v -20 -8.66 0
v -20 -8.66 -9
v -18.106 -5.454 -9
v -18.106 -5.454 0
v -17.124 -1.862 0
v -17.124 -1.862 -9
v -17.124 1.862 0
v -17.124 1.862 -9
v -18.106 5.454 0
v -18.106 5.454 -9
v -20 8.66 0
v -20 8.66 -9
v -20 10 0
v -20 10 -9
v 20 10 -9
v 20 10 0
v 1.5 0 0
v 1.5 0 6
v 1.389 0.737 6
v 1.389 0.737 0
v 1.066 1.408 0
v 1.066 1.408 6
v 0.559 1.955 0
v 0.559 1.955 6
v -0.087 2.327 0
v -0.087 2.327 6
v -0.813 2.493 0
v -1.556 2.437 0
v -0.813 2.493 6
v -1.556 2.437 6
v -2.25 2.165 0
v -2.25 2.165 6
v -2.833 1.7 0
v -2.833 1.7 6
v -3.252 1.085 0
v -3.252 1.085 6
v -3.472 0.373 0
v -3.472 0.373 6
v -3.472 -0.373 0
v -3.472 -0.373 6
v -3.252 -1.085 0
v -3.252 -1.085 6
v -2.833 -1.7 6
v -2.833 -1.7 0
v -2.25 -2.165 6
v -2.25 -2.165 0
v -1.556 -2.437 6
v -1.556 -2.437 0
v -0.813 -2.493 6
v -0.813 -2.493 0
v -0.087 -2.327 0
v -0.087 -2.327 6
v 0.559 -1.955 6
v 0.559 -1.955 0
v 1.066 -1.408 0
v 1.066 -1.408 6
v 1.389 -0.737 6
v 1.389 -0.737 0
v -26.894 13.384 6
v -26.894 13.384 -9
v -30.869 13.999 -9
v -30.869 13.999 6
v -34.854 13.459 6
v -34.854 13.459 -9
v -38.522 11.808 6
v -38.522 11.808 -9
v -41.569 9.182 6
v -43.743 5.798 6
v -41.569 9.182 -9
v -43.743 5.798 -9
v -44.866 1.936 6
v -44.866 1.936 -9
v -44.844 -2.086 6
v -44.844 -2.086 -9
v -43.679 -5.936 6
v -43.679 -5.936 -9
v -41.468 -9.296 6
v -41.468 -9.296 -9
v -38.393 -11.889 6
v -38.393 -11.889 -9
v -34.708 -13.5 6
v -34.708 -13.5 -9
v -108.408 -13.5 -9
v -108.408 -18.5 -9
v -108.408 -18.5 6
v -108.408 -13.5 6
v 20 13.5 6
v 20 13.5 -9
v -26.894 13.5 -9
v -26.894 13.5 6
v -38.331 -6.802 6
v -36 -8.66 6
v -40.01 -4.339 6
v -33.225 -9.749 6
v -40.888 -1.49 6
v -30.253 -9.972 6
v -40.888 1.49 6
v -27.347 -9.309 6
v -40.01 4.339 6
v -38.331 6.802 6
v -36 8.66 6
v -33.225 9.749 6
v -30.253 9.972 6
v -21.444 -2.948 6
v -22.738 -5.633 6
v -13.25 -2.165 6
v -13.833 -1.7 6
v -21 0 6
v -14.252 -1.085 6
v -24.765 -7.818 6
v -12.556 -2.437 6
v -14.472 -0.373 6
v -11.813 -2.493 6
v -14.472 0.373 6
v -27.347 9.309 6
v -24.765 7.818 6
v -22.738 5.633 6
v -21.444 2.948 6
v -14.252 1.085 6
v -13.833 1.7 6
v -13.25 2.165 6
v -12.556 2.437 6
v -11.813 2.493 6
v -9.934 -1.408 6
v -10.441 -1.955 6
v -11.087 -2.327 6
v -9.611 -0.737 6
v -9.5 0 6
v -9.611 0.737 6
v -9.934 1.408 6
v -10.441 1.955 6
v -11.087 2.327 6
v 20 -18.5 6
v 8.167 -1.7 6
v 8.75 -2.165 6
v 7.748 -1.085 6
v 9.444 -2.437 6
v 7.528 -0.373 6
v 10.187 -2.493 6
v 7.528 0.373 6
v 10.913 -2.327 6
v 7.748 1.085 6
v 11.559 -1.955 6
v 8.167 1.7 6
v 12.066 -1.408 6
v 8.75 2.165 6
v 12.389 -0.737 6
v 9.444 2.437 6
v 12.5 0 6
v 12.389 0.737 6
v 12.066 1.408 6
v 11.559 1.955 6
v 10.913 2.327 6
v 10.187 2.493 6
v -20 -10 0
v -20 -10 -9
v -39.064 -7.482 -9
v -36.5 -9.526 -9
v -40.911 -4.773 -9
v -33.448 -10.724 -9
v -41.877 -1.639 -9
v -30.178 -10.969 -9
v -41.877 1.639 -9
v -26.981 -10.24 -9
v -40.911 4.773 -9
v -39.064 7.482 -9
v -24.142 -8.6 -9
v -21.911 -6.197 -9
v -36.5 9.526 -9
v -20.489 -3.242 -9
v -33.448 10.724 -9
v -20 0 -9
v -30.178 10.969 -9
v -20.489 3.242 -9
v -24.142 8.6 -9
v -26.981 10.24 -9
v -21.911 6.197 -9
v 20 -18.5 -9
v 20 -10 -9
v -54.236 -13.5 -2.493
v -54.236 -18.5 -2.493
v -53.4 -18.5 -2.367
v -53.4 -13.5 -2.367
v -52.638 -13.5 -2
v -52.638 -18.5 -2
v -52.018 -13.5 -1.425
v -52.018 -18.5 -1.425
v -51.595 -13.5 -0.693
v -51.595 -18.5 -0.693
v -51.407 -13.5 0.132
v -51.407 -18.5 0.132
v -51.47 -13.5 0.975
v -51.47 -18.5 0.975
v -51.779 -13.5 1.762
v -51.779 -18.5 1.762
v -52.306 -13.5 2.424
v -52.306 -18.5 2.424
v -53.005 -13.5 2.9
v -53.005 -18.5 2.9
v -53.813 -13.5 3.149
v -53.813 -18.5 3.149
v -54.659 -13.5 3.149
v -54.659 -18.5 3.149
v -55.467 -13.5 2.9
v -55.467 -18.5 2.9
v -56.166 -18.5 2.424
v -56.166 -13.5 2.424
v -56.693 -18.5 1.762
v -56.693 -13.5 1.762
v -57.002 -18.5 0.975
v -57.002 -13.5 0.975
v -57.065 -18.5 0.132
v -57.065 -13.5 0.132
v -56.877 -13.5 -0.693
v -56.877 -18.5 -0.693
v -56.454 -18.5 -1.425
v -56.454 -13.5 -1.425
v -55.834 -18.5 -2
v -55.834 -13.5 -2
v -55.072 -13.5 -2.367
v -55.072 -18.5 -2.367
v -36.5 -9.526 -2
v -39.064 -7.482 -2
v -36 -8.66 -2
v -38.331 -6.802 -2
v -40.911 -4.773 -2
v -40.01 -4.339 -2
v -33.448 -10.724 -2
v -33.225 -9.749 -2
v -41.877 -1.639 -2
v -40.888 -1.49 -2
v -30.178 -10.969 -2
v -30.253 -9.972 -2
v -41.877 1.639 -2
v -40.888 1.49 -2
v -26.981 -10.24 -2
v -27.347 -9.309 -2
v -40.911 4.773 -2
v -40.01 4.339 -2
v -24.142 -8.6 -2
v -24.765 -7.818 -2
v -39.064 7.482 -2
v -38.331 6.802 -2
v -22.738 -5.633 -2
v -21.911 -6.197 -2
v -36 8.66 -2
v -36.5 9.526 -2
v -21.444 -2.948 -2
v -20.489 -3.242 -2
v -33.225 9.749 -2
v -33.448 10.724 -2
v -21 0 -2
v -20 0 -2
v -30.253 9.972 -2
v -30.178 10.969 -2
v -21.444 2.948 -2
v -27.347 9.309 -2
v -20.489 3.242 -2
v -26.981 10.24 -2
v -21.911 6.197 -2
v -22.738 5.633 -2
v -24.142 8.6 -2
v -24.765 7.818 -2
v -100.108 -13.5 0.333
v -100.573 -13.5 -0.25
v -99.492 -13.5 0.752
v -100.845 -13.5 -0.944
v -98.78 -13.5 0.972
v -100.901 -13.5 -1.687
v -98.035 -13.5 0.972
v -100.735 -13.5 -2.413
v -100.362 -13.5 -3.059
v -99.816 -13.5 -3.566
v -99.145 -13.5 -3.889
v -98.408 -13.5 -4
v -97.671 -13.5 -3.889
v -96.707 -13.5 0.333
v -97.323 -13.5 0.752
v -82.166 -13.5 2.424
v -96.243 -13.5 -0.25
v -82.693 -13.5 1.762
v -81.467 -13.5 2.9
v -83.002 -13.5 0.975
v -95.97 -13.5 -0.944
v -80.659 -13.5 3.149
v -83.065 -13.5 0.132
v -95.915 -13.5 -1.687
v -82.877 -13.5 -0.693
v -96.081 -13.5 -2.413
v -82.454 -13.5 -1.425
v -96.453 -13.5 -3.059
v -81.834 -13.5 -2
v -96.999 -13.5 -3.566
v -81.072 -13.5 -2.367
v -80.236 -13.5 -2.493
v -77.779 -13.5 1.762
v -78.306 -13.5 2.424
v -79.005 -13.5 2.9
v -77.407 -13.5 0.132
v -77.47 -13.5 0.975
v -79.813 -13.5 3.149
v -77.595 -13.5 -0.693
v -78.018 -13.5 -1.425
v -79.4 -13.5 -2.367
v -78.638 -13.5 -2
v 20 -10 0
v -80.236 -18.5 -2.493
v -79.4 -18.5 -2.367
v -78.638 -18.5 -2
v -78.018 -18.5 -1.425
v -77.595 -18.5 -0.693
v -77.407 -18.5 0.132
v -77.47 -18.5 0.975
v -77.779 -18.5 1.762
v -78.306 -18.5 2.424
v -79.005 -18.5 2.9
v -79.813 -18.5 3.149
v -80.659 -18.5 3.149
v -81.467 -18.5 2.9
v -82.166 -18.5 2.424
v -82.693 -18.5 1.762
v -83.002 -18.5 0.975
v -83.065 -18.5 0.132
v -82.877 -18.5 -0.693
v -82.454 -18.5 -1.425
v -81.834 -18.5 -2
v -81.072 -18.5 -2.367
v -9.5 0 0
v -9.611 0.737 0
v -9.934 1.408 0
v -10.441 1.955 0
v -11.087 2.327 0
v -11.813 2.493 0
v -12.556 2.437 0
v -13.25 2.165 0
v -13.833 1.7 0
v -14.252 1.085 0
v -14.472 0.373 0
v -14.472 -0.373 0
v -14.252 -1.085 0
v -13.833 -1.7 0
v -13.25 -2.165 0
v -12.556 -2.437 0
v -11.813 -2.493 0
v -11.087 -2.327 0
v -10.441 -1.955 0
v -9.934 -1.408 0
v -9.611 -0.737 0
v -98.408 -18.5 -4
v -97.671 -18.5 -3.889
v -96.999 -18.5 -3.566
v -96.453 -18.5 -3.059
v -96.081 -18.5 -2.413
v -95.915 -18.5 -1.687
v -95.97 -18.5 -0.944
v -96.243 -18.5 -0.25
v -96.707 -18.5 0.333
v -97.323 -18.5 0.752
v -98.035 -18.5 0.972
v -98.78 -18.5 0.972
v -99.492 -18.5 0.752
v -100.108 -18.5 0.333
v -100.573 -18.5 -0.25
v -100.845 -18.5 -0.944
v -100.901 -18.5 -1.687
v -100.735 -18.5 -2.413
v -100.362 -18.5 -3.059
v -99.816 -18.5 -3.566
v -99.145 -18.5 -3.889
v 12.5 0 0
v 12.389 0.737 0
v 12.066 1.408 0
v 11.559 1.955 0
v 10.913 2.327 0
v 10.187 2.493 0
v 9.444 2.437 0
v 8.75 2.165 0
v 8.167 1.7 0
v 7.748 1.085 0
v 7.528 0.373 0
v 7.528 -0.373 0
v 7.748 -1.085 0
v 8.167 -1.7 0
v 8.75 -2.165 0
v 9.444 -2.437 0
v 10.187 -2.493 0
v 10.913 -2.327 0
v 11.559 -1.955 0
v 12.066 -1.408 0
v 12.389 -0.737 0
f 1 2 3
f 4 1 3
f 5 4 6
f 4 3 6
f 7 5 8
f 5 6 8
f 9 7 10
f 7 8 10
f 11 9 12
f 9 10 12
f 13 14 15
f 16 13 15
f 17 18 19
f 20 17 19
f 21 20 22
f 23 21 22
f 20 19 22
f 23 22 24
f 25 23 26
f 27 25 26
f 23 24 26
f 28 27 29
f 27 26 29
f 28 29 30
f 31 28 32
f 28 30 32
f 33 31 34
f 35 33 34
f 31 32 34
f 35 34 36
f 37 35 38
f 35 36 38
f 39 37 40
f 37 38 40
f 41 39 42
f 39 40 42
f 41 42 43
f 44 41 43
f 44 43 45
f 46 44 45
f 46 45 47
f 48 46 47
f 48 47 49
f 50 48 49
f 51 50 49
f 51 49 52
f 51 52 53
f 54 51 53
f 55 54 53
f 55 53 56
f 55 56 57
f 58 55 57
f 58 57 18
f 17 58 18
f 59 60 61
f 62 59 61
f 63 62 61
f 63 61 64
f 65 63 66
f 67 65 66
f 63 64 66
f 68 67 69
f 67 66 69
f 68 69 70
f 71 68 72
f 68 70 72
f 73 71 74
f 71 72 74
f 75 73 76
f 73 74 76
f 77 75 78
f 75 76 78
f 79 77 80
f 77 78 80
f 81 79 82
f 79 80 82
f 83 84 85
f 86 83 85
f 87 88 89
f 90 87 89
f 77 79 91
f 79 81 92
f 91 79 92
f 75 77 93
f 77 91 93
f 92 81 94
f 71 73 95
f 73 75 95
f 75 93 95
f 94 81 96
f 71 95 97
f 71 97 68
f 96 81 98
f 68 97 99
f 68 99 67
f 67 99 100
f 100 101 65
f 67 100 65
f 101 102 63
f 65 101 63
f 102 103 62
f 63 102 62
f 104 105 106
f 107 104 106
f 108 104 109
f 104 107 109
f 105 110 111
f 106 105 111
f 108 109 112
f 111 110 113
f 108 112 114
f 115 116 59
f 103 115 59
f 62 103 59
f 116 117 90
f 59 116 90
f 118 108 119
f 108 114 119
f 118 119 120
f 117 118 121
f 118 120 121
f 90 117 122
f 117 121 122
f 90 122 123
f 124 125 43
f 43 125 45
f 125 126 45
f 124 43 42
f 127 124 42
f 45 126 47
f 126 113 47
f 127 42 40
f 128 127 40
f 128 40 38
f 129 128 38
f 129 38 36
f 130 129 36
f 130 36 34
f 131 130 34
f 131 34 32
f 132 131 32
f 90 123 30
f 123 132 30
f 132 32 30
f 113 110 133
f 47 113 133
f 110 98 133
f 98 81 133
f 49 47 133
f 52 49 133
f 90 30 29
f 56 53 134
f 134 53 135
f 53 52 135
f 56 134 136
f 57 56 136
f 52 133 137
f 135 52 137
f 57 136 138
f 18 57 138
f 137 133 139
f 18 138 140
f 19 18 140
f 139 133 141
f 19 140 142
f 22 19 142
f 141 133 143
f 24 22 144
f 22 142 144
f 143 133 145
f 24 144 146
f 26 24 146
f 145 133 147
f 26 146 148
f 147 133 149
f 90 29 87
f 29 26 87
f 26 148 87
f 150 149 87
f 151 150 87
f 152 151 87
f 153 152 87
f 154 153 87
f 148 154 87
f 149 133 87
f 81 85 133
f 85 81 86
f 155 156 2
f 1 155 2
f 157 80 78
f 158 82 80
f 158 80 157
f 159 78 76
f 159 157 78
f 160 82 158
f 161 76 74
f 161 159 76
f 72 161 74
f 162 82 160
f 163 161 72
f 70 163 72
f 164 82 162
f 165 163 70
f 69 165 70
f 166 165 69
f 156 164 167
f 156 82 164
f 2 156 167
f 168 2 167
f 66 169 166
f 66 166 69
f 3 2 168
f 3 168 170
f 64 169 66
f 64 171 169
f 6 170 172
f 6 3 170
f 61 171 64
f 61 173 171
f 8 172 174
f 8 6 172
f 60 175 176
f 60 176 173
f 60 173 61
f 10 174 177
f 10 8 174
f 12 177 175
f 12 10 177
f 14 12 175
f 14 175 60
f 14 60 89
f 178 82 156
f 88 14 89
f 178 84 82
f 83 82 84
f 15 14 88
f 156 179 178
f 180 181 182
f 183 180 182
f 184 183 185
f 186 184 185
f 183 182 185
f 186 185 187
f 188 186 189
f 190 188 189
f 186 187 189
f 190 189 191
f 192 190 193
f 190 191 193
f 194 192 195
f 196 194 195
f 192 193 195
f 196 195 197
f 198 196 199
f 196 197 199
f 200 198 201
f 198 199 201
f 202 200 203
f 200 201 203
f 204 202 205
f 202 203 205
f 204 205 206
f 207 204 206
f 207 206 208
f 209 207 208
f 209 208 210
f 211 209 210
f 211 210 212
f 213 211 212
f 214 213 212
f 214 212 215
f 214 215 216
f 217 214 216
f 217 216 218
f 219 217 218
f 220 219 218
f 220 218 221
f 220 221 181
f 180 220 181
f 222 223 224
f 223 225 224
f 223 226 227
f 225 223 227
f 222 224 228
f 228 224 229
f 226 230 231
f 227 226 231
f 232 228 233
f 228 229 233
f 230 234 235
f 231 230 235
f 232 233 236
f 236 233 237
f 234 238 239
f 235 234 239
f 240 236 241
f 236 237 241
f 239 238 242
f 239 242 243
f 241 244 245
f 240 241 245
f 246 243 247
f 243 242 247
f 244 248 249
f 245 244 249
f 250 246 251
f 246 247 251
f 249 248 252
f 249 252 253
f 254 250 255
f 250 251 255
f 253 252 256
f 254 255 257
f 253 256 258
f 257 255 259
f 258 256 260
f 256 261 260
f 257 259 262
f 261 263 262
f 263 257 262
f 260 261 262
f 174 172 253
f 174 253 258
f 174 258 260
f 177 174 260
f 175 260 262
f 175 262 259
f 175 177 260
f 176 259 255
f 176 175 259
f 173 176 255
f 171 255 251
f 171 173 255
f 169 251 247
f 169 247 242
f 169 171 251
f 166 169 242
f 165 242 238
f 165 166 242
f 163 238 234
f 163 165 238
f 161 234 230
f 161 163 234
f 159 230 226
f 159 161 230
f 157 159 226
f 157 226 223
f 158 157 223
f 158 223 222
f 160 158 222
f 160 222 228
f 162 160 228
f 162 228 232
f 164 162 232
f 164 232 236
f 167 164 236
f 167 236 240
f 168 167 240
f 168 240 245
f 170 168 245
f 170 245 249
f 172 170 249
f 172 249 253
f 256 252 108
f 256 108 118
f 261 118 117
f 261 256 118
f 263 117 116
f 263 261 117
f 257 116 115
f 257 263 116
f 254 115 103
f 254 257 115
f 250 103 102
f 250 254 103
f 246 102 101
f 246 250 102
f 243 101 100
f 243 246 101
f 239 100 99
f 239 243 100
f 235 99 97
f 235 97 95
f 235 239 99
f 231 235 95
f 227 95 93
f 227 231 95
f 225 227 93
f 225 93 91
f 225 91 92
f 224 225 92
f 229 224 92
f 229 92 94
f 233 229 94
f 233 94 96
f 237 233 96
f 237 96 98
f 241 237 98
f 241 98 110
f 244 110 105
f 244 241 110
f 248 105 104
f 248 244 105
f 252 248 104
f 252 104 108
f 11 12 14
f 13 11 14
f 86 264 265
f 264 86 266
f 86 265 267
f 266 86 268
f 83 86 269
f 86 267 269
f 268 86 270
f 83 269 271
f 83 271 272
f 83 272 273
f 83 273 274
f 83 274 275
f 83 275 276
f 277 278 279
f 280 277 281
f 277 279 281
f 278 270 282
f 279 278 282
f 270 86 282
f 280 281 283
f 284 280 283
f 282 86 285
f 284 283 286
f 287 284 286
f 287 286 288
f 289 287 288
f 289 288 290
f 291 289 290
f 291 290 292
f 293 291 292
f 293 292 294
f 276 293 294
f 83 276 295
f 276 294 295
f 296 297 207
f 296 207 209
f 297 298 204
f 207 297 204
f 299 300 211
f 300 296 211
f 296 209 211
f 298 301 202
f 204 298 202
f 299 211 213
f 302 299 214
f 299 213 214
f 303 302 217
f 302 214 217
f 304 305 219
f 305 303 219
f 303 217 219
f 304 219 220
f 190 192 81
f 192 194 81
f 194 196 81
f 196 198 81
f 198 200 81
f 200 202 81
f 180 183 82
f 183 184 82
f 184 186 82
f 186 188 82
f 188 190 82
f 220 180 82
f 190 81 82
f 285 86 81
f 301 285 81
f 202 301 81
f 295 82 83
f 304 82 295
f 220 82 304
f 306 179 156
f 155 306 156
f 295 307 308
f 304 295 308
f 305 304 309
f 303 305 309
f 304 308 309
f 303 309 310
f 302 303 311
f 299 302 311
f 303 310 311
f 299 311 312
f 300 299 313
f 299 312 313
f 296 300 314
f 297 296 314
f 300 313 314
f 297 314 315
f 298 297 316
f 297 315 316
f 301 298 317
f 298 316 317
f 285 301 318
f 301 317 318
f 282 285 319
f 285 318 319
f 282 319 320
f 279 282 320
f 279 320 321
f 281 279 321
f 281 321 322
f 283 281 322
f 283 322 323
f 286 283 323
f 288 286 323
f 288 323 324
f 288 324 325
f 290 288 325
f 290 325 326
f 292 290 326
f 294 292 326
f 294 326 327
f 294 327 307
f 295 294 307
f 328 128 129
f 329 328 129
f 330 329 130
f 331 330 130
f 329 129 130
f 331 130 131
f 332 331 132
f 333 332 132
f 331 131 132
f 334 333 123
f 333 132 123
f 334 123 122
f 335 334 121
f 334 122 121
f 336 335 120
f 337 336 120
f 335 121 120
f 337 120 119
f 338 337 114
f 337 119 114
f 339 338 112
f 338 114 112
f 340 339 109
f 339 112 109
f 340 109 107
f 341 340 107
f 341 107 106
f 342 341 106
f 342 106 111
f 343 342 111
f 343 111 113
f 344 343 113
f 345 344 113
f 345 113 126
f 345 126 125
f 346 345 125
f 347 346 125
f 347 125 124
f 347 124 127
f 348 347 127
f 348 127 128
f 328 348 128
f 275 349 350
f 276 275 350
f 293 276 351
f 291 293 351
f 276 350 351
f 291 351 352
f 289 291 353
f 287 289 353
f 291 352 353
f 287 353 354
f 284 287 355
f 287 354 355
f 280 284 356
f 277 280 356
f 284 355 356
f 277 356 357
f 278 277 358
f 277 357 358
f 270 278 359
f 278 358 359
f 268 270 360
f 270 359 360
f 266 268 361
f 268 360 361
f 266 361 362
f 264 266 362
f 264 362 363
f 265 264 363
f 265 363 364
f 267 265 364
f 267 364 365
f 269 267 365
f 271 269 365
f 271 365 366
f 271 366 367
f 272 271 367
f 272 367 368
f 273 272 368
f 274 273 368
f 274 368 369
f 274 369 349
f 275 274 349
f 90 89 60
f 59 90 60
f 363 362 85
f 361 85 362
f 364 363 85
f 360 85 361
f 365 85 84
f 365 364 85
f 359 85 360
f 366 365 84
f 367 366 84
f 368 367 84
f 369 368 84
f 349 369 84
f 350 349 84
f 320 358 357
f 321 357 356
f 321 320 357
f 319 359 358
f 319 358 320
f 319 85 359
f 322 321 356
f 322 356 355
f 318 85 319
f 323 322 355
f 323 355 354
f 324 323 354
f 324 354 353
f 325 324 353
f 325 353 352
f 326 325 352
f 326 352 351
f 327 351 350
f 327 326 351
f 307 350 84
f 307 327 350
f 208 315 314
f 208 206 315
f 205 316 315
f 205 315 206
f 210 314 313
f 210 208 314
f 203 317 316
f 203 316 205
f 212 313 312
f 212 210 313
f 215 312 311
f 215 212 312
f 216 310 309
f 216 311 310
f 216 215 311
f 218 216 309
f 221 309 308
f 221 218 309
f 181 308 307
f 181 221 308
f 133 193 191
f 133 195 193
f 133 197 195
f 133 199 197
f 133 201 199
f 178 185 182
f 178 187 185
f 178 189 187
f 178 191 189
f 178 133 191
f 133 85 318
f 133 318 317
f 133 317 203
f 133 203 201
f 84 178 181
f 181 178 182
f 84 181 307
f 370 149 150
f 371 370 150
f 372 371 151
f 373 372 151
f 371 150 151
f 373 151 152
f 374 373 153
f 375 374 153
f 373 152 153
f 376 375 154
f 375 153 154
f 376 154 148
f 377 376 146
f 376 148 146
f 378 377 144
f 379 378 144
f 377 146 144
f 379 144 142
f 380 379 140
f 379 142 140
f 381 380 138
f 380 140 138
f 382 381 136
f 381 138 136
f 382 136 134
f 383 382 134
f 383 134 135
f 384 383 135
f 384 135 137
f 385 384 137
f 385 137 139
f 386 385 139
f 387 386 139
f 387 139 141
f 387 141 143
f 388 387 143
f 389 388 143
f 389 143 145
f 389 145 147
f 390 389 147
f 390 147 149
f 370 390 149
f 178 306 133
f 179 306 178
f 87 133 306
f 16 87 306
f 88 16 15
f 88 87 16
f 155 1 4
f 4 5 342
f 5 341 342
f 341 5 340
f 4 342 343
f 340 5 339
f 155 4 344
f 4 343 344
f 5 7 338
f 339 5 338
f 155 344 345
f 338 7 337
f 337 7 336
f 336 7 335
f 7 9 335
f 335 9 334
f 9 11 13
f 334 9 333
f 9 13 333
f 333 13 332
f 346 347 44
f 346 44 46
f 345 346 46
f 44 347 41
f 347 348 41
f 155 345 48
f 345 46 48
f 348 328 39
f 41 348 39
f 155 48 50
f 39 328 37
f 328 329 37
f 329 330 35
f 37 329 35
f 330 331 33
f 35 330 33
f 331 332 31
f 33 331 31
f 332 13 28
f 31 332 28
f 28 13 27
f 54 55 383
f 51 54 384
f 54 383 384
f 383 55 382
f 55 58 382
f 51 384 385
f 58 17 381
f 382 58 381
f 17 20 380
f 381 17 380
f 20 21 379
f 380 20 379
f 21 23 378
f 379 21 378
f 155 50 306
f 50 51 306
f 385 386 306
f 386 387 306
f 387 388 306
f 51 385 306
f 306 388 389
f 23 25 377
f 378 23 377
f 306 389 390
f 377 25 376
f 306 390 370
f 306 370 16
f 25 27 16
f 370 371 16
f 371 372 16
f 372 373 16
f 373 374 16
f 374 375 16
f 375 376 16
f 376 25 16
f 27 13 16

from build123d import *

# Parameters (mm, degrees)
SKETCH_1_W          = 40
SKETCH_1_H          = 20
EXTRUDE_1_DEPTH     = 6
SKETCH_2_R          = 2.5
CUT_EXTRUDE_1_DEPTH = 24.151673806
EXTRUDE_START       = -15
EXTRUDE_2_OUTLINE_R = 11
EXTRUDE_2_DEPTH     = 15
EXTRUDE_START_2     = -8
SKETCH_5_R          = 11
SKETCH_5_R_2        = 10
EXTRUDE_3_DEPTH     = 8
SKETCH_10_W         = 15
SKETCH_10_H         = 5
EXTRUDE_4_DEPTH     = 200
SKETCH_11_W         = 3.09493726
SKETCH_11_H         = 3.09493726
EXTRUDE_5_DEPTH     = 15
SKETCH_17_W         = 83.501719846
SKETCH_17_H         = 42.356909186
CUT_EXTRUDE_2_DEPTH = 184.131783151
SKETCH_18_R         = 2.5
CUT_EXTRUDE_3_DEPTH = 10
SKETCH_20_R         = 2.837069856
CUT_EXTRUDE_4_DEPTH = 10


# Read off the part's stored shape, not the designer's step: 凸台-拉伸2
with BuildPart() as part:
    # 草图1 → 凸台-拉伸1 (new body)
    with BuildSketch(Plane.XY):
        Rectangle(SKETCH_1_W, SKETCH_1_H)
    extrude(amount=EXTRUDE_1_DEPTH)

    # 草图2 → 切除-拉伸1 (cut, through all)
    with BuildSketch(Plane.XY.offset(6)):
        with Locations((10, 0)):
            Circle(SKETCH_2_R)
        with Locations((-1, 0)):
            Circle(SKETCH_2_R)
        with Locations((-12, 0)):
            Circle(SKETCH_2_R)
    extrude(amount=-CUT_EXTRUDE_1_DEPTH, mode=Mode.SUBTRACT)

    # 凸台-拉伸2 outline → 凸台-拉伸2 (add)
    with BuildSketch(Plane.XY.offset(6).offset(EXTRUDE_START)):
        with BuildLine():
            Line((20, 10), (20, 13.5))
            Line((20, 13.5), (-26.893967141, 13.5))
            Line((-26.893967141, 13.5), (-26.893967141, 13.384337644))
            ThreePointArc((-26.893967141, 13.384337644), (-45, 0), (-26.893967141, -13.384337644))
            Line((-26.893967141, -13.384337644), (-26.893967141, -13.5))
            Line((-26.893967141, -13.5), (20, -13.5))
            Line((20, -13.5), (20, -10))
            Line((20, -10), (-20, -10))
            Line((-20, -10), (-20, -8.660254038))
            ThreePointArc((-20, -8.660254038), (-17, 0), (-20, 8.660254038))
            Line((-20, 8.660254038), (-20, 10))
            Line((-20, 10), (20, 10))
        make_face()
        with Locations((-31, 0)):
            Circle(EXTRUDE_2_OUTLINE_R, mode=Mode.SUBTRACT)
    extrude(amount=EXTRUDE_2_DEPTH)

    # 草图5 → 凸台-拉伸3 (add)
    with BuildSketch(Plane.XY.offset(6).offset(EXTRUDE_START_2)):
        with Locations((-31, 0)):
            Circle(SKETCH_5_R)
        with Locations((-31, 0)):
            Circle(SKETCH_5_R_2, mode=Mode.SUBTRACT)
    extrude(amount=EXTRUDE_3_DEPTH)

    # 草图10 → 凸台-拉伸4 (add)
    with BuildSketch(Plane(origin=(20, 0, 0), x_dir=(0, 0, -1), z_dir=(1, 0, 0))):
        with Locations((1.5, -16)):
            Rectangle(SKETCH_10_W, SKETCH_10_H)
    extrude(amount=-EXTRUDE_4_DEPTH)

    # 草图11 → 凸台-拉伸5 (add, through all)
    with BuildSketch(Plane.XY.offset(6)):
        with Locations((-27.071814196, -13.413570993)):
            Rectangle(SKETCH_11_W, SKETCH_11_H)
    extrude(amount=-EXTRUDE_5_DEPTH)

    # 草图17 → 切除-拉伸2 (cut, through all)
    with BuildSketch(Plane.XZ.offset(18.5)):
        with Locations((-150.158557574, 4.061352957)):
            Rectangle(SKETCH_17_W, SKETCH_17_H)
    extrude(amount=-CUT_EXTRUDE_2_DEPTH, mode=Mode.SUBTRACT)

    # 草图18 → 切除-拉伸3 (cut)
    with BuildSketch(Plane.XZ.offset(18.5)):
        with Locations(Location((-98.407697651, -1.5, 0), (0, 0, 270))):
            Circle(SKETCH_18_R)
    extrude(amount=-CUT_EXTRUDE_3_DEPTH, mode=Mode.SUBTRACT)

    # 草图20 → 切除-拉伸4 (cut)
    with BuildSketch(Plane.XZ.offset(18.5)):
        with Locations(Location((-54.23606844, 0.343836832, 0), (0, 0, 270))):
            Circle(SKETCH_20_R)
        with Locations(Location((-80.23606844, 0.343836832, 0), (0, 0, 270))):
            Circle(SKETCH_20_R)
    extrude(amount=-CUT_EXTRUDE_4_DEPTH, mode=Mode.SUBTRACT)


solid = part.part
